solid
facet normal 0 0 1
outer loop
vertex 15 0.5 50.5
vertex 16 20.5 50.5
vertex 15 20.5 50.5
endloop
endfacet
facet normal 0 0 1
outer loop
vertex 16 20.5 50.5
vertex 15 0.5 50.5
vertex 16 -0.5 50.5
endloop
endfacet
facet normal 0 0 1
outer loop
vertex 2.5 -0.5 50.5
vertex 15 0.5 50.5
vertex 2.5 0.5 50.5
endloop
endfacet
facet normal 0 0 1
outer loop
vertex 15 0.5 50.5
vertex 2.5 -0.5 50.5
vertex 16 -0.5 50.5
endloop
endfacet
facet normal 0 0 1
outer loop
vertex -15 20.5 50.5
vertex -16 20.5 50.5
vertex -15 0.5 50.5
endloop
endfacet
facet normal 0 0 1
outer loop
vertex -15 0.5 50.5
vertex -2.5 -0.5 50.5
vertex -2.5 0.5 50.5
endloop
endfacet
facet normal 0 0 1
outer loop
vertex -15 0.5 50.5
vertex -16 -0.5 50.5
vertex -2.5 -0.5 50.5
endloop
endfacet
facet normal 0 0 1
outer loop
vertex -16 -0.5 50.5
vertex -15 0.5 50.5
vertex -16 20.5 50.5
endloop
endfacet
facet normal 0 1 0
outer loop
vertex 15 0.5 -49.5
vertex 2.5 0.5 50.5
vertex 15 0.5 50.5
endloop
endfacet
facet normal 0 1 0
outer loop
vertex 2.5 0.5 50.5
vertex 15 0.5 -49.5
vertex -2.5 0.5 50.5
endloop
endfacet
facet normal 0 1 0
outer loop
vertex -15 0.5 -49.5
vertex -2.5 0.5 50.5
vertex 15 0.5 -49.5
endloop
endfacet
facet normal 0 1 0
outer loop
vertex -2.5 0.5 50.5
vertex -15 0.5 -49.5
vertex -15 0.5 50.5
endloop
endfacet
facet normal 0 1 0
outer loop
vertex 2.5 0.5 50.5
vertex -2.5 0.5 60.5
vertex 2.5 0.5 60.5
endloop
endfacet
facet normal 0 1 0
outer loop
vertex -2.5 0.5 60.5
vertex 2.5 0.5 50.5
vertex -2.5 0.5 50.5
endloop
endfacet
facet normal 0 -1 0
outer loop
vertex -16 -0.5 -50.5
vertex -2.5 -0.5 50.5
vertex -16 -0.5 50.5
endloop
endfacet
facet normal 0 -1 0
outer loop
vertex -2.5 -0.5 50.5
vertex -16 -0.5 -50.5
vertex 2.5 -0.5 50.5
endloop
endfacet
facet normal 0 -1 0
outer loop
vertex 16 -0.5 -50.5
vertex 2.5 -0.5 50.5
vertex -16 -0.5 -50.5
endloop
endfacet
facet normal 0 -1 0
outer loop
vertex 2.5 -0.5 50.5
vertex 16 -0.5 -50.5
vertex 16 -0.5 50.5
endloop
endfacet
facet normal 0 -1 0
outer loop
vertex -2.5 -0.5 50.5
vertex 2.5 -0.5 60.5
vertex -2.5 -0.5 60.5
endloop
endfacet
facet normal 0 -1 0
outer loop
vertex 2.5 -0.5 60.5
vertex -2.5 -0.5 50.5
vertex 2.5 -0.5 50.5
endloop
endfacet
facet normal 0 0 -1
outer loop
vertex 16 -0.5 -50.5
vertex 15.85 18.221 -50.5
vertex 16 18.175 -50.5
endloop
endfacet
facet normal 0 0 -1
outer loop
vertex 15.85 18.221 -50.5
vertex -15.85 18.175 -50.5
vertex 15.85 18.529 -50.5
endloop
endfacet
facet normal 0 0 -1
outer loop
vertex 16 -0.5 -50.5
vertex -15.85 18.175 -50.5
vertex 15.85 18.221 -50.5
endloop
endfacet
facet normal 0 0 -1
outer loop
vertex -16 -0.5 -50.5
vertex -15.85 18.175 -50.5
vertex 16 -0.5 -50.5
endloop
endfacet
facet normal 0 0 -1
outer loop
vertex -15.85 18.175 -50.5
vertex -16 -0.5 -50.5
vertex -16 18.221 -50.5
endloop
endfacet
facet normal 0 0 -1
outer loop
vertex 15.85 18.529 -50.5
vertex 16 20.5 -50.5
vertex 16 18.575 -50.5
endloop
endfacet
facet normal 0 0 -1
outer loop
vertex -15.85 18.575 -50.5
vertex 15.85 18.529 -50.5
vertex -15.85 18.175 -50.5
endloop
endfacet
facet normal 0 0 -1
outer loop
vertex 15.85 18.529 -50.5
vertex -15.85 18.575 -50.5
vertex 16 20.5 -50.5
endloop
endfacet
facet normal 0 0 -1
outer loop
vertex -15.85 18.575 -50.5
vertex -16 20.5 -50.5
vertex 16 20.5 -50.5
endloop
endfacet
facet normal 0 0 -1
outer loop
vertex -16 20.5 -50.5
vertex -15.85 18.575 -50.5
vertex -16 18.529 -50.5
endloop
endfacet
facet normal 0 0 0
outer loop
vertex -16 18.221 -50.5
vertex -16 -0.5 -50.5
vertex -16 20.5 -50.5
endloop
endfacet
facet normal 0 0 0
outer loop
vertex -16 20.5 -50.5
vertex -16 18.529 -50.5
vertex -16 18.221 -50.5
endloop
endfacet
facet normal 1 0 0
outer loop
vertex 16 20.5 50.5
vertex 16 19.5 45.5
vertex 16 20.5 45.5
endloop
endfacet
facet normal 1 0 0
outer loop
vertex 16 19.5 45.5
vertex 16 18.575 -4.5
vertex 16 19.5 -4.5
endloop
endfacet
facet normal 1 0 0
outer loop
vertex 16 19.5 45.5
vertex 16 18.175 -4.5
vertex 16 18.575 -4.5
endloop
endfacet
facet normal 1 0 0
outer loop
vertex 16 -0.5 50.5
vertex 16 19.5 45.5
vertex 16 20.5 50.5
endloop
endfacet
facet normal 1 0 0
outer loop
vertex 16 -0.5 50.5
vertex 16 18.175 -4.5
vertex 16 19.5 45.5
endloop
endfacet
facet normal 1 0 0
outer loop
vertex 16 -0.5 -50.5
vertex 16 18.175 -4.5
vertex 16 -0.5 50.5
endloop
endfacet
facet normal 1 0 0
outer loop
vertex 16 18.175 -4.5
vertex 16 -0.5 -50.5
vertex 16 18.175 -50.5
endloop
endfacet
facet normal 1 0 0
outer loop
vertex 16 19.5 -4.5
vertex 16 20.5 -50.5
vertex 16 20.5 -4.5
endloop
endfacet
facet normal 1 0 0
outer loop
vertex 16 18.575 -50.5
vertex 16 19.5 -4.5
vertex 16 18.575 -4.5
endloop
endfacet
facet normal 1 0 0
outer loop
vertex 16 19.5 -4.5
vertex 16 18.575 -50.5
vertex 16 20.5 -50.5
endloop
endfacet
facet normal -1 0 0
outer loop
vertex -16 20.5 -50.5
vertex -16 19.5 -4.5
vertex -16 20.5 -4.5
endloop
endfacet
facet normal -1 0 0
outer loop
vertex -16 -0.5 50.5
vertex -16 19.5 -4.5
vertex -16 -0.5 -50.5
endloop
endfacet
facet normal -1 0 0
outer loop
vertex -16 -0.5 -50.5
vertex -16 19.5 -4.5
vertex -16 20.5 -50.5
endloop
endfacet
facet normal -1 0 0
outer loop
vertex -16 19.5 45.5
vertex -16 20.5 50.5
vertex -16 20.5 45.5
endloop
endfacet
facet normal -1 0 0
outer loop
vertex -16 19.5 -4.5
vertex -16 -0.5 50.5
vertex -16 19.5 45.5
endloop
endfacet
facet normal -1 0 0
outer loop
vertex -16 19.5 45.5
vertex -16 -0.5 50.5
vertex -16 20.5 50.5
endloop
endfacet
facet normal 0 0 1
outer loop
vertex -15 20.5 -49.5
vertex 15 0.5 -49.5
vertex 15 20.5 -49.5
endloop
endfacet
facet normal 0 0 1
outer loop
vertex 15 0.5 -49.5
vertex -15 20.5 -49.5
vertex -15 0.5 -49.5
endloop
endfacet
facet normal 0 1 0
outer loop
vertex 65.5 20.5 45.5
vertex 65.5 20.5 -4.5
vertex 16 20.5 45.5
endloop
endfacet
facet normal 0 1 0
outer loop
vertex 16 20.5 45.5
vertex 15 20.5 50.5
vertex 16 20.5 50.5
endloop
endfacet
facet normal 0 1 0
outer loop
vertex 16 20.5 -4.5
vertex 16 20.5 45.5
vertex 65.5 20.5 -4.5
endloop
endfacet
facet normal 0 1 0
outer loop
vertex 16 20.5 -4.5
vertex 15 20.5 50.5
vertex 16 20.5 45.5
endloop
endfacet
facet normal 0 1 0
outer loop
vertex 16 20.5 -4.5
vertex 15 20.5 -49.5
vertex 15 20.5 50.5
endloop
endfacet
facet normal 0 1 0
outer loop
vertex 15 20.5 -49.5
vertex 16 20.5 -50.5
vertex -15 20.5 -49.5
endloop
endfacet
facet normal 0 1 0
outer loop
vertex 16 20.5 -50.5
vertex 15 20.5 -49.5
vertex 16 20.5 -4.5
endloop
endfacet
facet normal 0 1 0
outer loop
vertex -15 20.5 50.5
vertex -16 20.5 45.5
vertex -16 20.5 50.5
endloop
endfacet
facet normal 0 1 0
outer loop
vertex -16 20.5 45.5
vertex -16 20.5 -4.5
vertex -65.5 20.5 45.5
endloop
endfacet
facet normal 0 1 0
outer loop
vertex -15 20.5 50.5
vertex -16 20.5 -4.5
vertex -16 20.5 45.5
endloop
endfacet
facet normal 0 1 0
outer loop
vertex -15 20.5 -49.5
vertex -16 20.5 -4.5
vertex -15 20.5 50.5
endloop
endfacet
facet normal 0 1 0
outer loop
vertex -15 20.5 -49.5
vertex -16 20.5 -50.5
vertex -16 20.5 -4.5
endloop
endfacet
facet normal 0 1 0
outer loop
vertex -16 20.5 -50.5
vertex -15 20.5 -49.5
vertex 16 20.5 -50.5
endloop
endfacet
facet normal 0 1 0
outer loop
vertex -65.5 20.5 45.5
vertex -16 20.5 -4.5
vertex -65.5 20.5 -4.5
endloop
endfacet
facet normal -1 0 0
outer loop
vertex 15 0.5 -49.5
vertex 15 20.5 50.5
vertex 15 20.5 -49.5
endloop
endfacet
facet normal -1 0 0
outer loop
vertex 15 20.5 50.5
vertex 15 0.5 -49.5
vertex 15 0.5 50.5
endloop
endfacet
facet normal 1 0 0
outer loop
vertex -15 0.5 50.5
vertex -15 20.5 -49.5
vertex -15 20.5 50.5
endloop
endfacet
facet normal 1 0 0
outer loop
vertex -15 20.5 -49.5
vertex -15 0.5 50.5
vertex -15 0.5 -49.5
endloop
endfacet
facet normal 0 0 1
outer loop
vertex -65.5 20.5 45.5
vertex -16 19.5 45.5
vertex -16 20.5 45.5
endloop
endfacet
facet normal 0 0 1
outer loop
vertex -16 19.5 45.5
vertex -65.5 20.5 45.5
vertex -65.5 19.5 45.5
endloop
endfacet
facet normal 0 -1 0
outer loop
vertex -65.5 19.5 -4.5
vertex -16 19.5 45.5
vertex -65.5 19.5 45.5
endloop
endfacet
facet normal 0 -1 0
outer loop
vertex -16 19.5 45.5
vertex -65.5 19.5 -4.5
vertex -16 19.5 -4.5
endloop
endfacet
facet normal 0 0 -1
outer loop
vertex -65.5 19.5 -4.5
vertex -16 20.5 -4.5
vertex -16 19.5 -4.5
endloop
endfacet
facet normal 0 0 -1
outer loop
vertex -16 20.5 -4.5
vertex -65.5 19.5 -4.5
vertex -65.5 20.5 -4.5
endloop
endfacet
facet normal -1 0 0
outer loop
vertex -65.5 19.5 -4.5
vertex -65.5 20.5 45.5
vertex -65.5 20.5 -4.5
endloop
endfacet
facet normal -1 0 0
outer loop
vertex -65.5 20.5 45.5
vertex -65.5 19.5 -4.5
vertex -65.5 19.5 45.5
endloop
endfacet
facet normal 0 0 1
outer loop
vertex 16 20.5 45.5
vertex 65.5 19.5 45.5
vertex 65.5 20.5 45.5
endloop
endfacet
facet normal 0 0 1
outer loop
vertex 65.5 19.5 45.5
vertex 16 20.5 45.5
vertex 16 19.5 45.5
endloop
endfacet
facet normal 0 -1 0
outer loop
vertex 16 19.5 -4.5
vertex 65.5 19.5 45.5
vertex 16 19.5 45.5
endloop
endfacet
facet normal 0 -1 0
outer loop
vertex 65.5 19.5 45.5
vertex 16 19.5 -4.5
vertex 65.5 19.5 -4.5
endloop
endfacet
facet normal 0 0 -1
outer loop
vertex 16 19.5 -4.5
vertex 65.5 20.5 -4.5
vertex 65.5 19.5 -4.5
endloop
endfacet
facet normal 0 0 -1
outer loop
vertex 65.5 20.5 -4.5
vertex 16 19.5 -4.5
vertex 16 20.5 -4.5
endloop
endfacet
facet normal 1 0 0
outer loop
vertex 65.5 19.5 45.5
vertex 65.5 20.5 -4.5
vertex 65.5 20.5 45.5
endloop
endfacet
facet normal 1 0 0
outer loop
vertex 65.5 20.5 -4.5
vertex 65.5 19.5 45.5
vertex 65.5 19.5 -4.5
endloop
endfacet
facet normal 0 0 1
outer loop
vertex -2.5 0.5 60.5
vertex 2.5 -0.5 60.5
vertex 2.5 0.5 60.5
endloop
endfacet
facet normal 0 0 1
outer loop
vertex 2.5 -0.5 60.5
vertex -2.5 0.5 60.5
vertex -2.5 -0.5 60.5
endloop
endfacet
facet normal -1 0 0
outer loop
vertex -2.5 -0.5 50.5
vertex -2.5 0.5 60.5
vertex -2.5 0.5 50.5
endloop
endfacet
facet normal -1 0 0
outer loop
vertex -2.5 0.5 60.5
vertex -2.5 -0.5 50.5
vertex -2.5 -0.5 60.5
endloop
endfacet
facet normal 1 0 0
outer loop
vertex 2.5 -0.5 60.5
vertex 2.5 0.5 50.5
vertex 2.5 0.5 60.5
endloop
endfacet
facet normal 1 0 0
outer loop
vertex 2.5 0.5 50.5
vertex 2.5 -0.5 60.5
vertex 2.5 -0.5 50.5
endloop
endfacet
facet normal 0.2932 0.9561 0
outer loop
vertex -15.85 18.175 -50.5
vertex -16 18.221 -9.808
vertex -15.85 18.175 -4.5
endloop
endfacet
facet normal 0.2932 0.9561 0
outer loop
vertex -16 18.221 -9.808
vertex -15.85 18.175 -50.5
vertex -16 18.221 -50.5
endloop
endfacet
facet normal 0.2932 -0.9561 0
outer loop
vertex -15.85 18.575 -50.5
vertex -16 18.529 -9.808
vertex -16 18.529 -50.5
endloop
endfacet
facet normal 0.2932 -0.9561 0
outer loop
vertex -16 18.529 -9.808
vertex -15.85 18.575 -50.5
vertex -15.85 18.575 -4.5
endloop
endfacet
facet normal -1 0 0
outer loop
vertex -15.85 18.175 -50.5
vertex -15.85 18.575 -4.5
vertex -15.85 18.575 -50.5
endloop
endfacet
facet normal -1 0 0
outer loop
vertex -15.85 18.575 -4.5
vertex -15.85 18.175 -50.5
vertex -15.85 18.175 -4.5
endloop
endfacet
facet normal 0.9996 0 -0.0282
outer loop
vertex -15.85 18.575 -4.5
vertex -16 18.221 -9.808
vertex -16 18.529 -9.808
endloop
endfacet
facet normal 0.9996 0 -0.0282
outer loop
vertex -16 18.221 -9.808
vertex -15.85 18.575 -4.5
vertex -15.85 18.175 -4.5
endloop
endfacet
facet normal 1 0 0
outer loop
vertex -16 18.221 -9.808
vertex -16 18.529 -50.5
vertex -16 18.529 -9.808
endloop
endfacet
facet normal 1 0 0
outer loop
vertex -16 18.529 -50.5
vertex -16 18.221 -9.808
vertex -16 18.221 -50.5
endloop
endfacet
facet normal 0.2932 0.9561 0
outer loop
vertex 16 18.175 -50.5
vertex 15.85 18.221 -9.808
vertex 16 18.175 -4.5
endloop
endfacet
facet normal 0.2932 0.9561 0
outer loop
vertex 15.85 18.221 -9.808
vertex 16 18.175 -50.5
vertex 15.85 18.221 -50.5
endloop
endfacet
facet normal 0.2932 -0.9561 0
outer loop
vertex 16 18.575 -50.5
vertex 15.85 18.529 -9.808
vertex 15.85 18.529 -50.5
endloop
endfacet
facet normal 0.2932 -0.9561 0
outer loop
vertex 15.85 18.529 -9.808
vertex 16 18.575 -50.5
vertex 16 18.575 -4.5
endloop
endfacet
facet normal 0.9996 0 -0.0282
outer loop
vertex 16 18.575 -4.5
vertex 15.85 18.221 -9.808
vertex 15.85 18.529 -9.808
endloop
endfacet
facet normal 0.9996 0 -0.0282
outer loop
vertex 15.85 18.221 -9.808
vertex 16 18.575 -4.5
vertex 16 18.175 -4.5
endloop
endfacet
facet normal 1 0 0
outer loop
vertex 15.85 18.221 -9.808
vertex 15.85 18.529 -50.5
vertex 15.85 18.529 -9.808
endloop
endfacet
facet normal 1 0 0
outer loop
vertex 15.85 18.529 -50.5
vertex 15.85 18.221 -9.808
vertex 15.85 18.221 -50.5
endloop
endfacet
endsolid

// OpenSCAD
// User Var in mm. ALL VARIABLES MUST BE POSITIVE!
l_u = 100; //Length of the main bed
w_u = 30; //Width of the main bed
H_u = 20; //Height of the main structure
wr_l_u = 50; //Length of the wing-rest
wr_w_u = 50; //Width of the wing-rest
pr_h_u = 10; //height of the proboscis rest
pr_w_u = 5;
t_u = 1; //Overall thickness. VERY IMPORTANT!
w_disp_u = 5; //displacement of the wingrests from the front of the main body
c_h_u = 5; //Overall height of the cap 
g_w_u = 0.4; //Grooves
g_h_u = 0.15; //Grooves

//Program Variables
l = l_u + t_u; //Length of the main bed
w = w_u + (2*t_u); //Width of the main bed
H = H_u + t_u; //Height of the main structure
wr_l = wr_l_u; //Length of the wing-rest
wr_w = wr_w_u; //Width of the wing-rest
pr_h = pr_h_u; //height of the proboscis rest
pr_w = pr_w_u;
t = t_u; //Overall thickness. VERY IMPORTANT!
w_disp = w_disp_u; //displacement of the wingrests from the front of the main body
c_h = c_h_u; //Overall height of the cap 
g_w = g_w_u;
g_h = g_h_u;
pos = 0 || 1; // Specifies whether the structure goes left or right. 0 is left; 1 is right. Or vice-versa.


module bed(length,width){
    cube([length, width, t], true);
    }

module side(pos){
    rotate([90,0,0]){
        if(pos== 1){
            translate([0,((H/2)-t/2),(w/-2)+t/2]){
                bed(l,H);
                }
                }else if(pos ==0){
                    translate([0,((H/2)-t/2),((w/2)-t/2)]){
                        bed(l,H);
   }
  }
 }
}

module wing(pos){
    if(wr_l < (l-w_disp)){
        if(pos == 1){
        translate([((l-wr_l)/2)-w_disp,-((wr_w+w-t)/2),H-t]){
            bed(wr_l,wr_w);
            }
            }else if(pos == 0){
                translate([((l-wr_l)/2)-w_disp,((w+wr_w-t)/2),H-t]){
                    bed(wr_l,wr_w);
   }
  }
 }
}
module cap_wing(pos){
    if(wr_l < l-w_disp){
        if(pos == 1){
        translate([((l-wr_l)/2)-w_disp,((wr_w+w)/2),0]){
            bed(wr_l,wr_w);
            }
            }else if(pos == 0){
                translate([((l-wr_l)/2)-w_disp,-((wr_w+w)/2),0]){
            bed(wr_l,wr_w);
            }
  }
 }
}
module proboscis_rest(){
    translate([(l+pr_h)/2,0,0]){
        rotate([0,180,0]) {
            bed(pr_h,pr_w);
}
 }
}
module endcap(){
    translate([(l/-2)+t/2,0,(H/2)-t/2]){
        rotate([0,90,0]){
            bed(H,w);
        }
    }
}
module useful_module(){
    bed(l,w);
    cap_wing(1); cap_wing(0);
    rotate([90,0,0]){
        union(){
            translate([-(wr_l+w_disp)/2,(-c_h/2)+t/2,(w+t)/2]){
            bed(l-(w_disp+wr_l),c_h);//back left lateral
            }
            translate([-(wr_l+w_disp)/2,-c_h/2+t/2,-(w-t)/2]){
                bed(l-(w_disp+wr_l),c_h);//back right lateral
            }
            rotate([0,90,0]) translate([0,-(c_h-t)/2,(-l/2)+t/2]){
                bed(w,c_h);//back horizontal
            }
//            rotate([0,-90,0])translate([0,-(c_h-t)/2,(-l/2)+t/2]){
//                bed(w,c_h);//front horizontal
//            }
            translate([(l/2-w_disp+(w_disp/2)),-(c_h-t)/2,(w-t)/2]){
                bed(w_disp,c_h);//front left lateral
            }  
            translate([l/2-w_disp+(w_disp/2),-(c_h-t)/2,-(w-t)/2]){
                bed(w_disp,c_h);//front right lateral
            }
            rotate([0,90,0]) translate([(w+wr_w-t)/2,-(c_h-t)/2,(l/2-wr_l-w_disp)+t/2]){
                bed(wr_w+t,c_h);//back right wingrest
            }
            rotate([0,90,0]) translate([(w+wr_w-t)/2,-(c_h-t)/2,(l/2-w_disp)-(t/2)]){
                bed(wr_w+t,c_h);//front right wingrest
            }
            rotate([0,90,0]) translate([-(w+wr_w+(t/8))/2,-(c_h-t)/2,(l/2-wr_l-w_disp)+t/2]){
                bed(wr_w,c_h); //back left wingrest
            }
            rotate([0,90,0])translate([-(w+wr_w-t)/2,-(c_h-t)/2,(l/2-w_disp)-t/2]){
                bed(wr_w+t,c_h);//front left wingrest
            }
            translate([(l+t)/2-2*w_disp,-(c_h-t)/2,(w/2)+wr_w-t/2]) {
                bed(wr_l,c_h);//left wingspanner
            }
            translate([(l+t)/2-2*w_disp,-(c_h-t)/2,-((w/2)+wr_w-t/2)]){
                bed(wr_l,c_h);//right wingspanner
            }
        }
    }
}
module groove(pos){
        if(pos==1){
            translate([(-w_disp-wr_l)/2,-w/2+g_h,7/8*H]){
                rotate([ 90.00, 0.00, 0.00 ]){
                    union(){
                        resize([(l-w_disp-wr_l),g_w,g_h]){
                        rotate([0,0,45]){
                                cylinder(r1=1,r2 = 1/1.3,h=1,false,$fn = 4);
                            //change the denominator of r2 to get different angles on the groove
                        }
                    }
                    translate([-w/2,0,0]){
                        resize([(l-w_disp-wr_l),g_w,g_h]){
                        rotate([0,0,45]){
                                cylinder(r1=1,r2 = 1/1.3,h=1,false,$fn = 4);
                            //change the denominator of r2 to get different angles on the groove
                        }
                    }
                }
                }
            }
        }
    }else{
            translate([(-w_disp-wr_l)/2,w/2,7/8*H]){
                rotate([ 90.00, 0.00, 0.00 ]){
                    union(){
                        resize([(l-w_disp-wr_l),g_w,g_h]){
                        rotate([0,0,45]){
                                cylinder(r1=1,r2 = 1/1.3,h=1,false,$fn = 4);
                            //change the denominator of r2 to get different angles on the groove
                        }
                    }
                    translate([-w/2,0,0]){
                        resize([(l-w_disp-wr_l),g_w,g_h]){
                        rotate([0,0,45]){
                                cylinder(r1=1,r2 = 1/1.3,h=1,false,$fn = 4);
                            //change the denominator of r2 to get different angles on the groove
                            }
                        }
                    }
                }
            }
        }
    }
}
 module holder_downer(){
     difference(){
     useful_module(); 
     translate([wr_l,0,0])cylinder(h = (t*1.008), r = t, center = true);
 }
}
module moth_sacrificer(){
    rotate([180,0,180]){
        rotate([270,90,0]){
            difference(){
                union(){
                    bed(l,w);
                    endcap();
                    side(1);      side(0);
                    wing(1);      wing(0);
                    proboscis_rest();
                }
                groove(1);
                groove(0);
            }
        }
    }
}
//groove(1);
moth_sacrificer();
//translate([ 0.00, H+c_h, 0.00 ])rotate([ 90.00, 270.00, 180.00 ]}holder_downer();

// FIXME : Calculate program variables using user variables !
